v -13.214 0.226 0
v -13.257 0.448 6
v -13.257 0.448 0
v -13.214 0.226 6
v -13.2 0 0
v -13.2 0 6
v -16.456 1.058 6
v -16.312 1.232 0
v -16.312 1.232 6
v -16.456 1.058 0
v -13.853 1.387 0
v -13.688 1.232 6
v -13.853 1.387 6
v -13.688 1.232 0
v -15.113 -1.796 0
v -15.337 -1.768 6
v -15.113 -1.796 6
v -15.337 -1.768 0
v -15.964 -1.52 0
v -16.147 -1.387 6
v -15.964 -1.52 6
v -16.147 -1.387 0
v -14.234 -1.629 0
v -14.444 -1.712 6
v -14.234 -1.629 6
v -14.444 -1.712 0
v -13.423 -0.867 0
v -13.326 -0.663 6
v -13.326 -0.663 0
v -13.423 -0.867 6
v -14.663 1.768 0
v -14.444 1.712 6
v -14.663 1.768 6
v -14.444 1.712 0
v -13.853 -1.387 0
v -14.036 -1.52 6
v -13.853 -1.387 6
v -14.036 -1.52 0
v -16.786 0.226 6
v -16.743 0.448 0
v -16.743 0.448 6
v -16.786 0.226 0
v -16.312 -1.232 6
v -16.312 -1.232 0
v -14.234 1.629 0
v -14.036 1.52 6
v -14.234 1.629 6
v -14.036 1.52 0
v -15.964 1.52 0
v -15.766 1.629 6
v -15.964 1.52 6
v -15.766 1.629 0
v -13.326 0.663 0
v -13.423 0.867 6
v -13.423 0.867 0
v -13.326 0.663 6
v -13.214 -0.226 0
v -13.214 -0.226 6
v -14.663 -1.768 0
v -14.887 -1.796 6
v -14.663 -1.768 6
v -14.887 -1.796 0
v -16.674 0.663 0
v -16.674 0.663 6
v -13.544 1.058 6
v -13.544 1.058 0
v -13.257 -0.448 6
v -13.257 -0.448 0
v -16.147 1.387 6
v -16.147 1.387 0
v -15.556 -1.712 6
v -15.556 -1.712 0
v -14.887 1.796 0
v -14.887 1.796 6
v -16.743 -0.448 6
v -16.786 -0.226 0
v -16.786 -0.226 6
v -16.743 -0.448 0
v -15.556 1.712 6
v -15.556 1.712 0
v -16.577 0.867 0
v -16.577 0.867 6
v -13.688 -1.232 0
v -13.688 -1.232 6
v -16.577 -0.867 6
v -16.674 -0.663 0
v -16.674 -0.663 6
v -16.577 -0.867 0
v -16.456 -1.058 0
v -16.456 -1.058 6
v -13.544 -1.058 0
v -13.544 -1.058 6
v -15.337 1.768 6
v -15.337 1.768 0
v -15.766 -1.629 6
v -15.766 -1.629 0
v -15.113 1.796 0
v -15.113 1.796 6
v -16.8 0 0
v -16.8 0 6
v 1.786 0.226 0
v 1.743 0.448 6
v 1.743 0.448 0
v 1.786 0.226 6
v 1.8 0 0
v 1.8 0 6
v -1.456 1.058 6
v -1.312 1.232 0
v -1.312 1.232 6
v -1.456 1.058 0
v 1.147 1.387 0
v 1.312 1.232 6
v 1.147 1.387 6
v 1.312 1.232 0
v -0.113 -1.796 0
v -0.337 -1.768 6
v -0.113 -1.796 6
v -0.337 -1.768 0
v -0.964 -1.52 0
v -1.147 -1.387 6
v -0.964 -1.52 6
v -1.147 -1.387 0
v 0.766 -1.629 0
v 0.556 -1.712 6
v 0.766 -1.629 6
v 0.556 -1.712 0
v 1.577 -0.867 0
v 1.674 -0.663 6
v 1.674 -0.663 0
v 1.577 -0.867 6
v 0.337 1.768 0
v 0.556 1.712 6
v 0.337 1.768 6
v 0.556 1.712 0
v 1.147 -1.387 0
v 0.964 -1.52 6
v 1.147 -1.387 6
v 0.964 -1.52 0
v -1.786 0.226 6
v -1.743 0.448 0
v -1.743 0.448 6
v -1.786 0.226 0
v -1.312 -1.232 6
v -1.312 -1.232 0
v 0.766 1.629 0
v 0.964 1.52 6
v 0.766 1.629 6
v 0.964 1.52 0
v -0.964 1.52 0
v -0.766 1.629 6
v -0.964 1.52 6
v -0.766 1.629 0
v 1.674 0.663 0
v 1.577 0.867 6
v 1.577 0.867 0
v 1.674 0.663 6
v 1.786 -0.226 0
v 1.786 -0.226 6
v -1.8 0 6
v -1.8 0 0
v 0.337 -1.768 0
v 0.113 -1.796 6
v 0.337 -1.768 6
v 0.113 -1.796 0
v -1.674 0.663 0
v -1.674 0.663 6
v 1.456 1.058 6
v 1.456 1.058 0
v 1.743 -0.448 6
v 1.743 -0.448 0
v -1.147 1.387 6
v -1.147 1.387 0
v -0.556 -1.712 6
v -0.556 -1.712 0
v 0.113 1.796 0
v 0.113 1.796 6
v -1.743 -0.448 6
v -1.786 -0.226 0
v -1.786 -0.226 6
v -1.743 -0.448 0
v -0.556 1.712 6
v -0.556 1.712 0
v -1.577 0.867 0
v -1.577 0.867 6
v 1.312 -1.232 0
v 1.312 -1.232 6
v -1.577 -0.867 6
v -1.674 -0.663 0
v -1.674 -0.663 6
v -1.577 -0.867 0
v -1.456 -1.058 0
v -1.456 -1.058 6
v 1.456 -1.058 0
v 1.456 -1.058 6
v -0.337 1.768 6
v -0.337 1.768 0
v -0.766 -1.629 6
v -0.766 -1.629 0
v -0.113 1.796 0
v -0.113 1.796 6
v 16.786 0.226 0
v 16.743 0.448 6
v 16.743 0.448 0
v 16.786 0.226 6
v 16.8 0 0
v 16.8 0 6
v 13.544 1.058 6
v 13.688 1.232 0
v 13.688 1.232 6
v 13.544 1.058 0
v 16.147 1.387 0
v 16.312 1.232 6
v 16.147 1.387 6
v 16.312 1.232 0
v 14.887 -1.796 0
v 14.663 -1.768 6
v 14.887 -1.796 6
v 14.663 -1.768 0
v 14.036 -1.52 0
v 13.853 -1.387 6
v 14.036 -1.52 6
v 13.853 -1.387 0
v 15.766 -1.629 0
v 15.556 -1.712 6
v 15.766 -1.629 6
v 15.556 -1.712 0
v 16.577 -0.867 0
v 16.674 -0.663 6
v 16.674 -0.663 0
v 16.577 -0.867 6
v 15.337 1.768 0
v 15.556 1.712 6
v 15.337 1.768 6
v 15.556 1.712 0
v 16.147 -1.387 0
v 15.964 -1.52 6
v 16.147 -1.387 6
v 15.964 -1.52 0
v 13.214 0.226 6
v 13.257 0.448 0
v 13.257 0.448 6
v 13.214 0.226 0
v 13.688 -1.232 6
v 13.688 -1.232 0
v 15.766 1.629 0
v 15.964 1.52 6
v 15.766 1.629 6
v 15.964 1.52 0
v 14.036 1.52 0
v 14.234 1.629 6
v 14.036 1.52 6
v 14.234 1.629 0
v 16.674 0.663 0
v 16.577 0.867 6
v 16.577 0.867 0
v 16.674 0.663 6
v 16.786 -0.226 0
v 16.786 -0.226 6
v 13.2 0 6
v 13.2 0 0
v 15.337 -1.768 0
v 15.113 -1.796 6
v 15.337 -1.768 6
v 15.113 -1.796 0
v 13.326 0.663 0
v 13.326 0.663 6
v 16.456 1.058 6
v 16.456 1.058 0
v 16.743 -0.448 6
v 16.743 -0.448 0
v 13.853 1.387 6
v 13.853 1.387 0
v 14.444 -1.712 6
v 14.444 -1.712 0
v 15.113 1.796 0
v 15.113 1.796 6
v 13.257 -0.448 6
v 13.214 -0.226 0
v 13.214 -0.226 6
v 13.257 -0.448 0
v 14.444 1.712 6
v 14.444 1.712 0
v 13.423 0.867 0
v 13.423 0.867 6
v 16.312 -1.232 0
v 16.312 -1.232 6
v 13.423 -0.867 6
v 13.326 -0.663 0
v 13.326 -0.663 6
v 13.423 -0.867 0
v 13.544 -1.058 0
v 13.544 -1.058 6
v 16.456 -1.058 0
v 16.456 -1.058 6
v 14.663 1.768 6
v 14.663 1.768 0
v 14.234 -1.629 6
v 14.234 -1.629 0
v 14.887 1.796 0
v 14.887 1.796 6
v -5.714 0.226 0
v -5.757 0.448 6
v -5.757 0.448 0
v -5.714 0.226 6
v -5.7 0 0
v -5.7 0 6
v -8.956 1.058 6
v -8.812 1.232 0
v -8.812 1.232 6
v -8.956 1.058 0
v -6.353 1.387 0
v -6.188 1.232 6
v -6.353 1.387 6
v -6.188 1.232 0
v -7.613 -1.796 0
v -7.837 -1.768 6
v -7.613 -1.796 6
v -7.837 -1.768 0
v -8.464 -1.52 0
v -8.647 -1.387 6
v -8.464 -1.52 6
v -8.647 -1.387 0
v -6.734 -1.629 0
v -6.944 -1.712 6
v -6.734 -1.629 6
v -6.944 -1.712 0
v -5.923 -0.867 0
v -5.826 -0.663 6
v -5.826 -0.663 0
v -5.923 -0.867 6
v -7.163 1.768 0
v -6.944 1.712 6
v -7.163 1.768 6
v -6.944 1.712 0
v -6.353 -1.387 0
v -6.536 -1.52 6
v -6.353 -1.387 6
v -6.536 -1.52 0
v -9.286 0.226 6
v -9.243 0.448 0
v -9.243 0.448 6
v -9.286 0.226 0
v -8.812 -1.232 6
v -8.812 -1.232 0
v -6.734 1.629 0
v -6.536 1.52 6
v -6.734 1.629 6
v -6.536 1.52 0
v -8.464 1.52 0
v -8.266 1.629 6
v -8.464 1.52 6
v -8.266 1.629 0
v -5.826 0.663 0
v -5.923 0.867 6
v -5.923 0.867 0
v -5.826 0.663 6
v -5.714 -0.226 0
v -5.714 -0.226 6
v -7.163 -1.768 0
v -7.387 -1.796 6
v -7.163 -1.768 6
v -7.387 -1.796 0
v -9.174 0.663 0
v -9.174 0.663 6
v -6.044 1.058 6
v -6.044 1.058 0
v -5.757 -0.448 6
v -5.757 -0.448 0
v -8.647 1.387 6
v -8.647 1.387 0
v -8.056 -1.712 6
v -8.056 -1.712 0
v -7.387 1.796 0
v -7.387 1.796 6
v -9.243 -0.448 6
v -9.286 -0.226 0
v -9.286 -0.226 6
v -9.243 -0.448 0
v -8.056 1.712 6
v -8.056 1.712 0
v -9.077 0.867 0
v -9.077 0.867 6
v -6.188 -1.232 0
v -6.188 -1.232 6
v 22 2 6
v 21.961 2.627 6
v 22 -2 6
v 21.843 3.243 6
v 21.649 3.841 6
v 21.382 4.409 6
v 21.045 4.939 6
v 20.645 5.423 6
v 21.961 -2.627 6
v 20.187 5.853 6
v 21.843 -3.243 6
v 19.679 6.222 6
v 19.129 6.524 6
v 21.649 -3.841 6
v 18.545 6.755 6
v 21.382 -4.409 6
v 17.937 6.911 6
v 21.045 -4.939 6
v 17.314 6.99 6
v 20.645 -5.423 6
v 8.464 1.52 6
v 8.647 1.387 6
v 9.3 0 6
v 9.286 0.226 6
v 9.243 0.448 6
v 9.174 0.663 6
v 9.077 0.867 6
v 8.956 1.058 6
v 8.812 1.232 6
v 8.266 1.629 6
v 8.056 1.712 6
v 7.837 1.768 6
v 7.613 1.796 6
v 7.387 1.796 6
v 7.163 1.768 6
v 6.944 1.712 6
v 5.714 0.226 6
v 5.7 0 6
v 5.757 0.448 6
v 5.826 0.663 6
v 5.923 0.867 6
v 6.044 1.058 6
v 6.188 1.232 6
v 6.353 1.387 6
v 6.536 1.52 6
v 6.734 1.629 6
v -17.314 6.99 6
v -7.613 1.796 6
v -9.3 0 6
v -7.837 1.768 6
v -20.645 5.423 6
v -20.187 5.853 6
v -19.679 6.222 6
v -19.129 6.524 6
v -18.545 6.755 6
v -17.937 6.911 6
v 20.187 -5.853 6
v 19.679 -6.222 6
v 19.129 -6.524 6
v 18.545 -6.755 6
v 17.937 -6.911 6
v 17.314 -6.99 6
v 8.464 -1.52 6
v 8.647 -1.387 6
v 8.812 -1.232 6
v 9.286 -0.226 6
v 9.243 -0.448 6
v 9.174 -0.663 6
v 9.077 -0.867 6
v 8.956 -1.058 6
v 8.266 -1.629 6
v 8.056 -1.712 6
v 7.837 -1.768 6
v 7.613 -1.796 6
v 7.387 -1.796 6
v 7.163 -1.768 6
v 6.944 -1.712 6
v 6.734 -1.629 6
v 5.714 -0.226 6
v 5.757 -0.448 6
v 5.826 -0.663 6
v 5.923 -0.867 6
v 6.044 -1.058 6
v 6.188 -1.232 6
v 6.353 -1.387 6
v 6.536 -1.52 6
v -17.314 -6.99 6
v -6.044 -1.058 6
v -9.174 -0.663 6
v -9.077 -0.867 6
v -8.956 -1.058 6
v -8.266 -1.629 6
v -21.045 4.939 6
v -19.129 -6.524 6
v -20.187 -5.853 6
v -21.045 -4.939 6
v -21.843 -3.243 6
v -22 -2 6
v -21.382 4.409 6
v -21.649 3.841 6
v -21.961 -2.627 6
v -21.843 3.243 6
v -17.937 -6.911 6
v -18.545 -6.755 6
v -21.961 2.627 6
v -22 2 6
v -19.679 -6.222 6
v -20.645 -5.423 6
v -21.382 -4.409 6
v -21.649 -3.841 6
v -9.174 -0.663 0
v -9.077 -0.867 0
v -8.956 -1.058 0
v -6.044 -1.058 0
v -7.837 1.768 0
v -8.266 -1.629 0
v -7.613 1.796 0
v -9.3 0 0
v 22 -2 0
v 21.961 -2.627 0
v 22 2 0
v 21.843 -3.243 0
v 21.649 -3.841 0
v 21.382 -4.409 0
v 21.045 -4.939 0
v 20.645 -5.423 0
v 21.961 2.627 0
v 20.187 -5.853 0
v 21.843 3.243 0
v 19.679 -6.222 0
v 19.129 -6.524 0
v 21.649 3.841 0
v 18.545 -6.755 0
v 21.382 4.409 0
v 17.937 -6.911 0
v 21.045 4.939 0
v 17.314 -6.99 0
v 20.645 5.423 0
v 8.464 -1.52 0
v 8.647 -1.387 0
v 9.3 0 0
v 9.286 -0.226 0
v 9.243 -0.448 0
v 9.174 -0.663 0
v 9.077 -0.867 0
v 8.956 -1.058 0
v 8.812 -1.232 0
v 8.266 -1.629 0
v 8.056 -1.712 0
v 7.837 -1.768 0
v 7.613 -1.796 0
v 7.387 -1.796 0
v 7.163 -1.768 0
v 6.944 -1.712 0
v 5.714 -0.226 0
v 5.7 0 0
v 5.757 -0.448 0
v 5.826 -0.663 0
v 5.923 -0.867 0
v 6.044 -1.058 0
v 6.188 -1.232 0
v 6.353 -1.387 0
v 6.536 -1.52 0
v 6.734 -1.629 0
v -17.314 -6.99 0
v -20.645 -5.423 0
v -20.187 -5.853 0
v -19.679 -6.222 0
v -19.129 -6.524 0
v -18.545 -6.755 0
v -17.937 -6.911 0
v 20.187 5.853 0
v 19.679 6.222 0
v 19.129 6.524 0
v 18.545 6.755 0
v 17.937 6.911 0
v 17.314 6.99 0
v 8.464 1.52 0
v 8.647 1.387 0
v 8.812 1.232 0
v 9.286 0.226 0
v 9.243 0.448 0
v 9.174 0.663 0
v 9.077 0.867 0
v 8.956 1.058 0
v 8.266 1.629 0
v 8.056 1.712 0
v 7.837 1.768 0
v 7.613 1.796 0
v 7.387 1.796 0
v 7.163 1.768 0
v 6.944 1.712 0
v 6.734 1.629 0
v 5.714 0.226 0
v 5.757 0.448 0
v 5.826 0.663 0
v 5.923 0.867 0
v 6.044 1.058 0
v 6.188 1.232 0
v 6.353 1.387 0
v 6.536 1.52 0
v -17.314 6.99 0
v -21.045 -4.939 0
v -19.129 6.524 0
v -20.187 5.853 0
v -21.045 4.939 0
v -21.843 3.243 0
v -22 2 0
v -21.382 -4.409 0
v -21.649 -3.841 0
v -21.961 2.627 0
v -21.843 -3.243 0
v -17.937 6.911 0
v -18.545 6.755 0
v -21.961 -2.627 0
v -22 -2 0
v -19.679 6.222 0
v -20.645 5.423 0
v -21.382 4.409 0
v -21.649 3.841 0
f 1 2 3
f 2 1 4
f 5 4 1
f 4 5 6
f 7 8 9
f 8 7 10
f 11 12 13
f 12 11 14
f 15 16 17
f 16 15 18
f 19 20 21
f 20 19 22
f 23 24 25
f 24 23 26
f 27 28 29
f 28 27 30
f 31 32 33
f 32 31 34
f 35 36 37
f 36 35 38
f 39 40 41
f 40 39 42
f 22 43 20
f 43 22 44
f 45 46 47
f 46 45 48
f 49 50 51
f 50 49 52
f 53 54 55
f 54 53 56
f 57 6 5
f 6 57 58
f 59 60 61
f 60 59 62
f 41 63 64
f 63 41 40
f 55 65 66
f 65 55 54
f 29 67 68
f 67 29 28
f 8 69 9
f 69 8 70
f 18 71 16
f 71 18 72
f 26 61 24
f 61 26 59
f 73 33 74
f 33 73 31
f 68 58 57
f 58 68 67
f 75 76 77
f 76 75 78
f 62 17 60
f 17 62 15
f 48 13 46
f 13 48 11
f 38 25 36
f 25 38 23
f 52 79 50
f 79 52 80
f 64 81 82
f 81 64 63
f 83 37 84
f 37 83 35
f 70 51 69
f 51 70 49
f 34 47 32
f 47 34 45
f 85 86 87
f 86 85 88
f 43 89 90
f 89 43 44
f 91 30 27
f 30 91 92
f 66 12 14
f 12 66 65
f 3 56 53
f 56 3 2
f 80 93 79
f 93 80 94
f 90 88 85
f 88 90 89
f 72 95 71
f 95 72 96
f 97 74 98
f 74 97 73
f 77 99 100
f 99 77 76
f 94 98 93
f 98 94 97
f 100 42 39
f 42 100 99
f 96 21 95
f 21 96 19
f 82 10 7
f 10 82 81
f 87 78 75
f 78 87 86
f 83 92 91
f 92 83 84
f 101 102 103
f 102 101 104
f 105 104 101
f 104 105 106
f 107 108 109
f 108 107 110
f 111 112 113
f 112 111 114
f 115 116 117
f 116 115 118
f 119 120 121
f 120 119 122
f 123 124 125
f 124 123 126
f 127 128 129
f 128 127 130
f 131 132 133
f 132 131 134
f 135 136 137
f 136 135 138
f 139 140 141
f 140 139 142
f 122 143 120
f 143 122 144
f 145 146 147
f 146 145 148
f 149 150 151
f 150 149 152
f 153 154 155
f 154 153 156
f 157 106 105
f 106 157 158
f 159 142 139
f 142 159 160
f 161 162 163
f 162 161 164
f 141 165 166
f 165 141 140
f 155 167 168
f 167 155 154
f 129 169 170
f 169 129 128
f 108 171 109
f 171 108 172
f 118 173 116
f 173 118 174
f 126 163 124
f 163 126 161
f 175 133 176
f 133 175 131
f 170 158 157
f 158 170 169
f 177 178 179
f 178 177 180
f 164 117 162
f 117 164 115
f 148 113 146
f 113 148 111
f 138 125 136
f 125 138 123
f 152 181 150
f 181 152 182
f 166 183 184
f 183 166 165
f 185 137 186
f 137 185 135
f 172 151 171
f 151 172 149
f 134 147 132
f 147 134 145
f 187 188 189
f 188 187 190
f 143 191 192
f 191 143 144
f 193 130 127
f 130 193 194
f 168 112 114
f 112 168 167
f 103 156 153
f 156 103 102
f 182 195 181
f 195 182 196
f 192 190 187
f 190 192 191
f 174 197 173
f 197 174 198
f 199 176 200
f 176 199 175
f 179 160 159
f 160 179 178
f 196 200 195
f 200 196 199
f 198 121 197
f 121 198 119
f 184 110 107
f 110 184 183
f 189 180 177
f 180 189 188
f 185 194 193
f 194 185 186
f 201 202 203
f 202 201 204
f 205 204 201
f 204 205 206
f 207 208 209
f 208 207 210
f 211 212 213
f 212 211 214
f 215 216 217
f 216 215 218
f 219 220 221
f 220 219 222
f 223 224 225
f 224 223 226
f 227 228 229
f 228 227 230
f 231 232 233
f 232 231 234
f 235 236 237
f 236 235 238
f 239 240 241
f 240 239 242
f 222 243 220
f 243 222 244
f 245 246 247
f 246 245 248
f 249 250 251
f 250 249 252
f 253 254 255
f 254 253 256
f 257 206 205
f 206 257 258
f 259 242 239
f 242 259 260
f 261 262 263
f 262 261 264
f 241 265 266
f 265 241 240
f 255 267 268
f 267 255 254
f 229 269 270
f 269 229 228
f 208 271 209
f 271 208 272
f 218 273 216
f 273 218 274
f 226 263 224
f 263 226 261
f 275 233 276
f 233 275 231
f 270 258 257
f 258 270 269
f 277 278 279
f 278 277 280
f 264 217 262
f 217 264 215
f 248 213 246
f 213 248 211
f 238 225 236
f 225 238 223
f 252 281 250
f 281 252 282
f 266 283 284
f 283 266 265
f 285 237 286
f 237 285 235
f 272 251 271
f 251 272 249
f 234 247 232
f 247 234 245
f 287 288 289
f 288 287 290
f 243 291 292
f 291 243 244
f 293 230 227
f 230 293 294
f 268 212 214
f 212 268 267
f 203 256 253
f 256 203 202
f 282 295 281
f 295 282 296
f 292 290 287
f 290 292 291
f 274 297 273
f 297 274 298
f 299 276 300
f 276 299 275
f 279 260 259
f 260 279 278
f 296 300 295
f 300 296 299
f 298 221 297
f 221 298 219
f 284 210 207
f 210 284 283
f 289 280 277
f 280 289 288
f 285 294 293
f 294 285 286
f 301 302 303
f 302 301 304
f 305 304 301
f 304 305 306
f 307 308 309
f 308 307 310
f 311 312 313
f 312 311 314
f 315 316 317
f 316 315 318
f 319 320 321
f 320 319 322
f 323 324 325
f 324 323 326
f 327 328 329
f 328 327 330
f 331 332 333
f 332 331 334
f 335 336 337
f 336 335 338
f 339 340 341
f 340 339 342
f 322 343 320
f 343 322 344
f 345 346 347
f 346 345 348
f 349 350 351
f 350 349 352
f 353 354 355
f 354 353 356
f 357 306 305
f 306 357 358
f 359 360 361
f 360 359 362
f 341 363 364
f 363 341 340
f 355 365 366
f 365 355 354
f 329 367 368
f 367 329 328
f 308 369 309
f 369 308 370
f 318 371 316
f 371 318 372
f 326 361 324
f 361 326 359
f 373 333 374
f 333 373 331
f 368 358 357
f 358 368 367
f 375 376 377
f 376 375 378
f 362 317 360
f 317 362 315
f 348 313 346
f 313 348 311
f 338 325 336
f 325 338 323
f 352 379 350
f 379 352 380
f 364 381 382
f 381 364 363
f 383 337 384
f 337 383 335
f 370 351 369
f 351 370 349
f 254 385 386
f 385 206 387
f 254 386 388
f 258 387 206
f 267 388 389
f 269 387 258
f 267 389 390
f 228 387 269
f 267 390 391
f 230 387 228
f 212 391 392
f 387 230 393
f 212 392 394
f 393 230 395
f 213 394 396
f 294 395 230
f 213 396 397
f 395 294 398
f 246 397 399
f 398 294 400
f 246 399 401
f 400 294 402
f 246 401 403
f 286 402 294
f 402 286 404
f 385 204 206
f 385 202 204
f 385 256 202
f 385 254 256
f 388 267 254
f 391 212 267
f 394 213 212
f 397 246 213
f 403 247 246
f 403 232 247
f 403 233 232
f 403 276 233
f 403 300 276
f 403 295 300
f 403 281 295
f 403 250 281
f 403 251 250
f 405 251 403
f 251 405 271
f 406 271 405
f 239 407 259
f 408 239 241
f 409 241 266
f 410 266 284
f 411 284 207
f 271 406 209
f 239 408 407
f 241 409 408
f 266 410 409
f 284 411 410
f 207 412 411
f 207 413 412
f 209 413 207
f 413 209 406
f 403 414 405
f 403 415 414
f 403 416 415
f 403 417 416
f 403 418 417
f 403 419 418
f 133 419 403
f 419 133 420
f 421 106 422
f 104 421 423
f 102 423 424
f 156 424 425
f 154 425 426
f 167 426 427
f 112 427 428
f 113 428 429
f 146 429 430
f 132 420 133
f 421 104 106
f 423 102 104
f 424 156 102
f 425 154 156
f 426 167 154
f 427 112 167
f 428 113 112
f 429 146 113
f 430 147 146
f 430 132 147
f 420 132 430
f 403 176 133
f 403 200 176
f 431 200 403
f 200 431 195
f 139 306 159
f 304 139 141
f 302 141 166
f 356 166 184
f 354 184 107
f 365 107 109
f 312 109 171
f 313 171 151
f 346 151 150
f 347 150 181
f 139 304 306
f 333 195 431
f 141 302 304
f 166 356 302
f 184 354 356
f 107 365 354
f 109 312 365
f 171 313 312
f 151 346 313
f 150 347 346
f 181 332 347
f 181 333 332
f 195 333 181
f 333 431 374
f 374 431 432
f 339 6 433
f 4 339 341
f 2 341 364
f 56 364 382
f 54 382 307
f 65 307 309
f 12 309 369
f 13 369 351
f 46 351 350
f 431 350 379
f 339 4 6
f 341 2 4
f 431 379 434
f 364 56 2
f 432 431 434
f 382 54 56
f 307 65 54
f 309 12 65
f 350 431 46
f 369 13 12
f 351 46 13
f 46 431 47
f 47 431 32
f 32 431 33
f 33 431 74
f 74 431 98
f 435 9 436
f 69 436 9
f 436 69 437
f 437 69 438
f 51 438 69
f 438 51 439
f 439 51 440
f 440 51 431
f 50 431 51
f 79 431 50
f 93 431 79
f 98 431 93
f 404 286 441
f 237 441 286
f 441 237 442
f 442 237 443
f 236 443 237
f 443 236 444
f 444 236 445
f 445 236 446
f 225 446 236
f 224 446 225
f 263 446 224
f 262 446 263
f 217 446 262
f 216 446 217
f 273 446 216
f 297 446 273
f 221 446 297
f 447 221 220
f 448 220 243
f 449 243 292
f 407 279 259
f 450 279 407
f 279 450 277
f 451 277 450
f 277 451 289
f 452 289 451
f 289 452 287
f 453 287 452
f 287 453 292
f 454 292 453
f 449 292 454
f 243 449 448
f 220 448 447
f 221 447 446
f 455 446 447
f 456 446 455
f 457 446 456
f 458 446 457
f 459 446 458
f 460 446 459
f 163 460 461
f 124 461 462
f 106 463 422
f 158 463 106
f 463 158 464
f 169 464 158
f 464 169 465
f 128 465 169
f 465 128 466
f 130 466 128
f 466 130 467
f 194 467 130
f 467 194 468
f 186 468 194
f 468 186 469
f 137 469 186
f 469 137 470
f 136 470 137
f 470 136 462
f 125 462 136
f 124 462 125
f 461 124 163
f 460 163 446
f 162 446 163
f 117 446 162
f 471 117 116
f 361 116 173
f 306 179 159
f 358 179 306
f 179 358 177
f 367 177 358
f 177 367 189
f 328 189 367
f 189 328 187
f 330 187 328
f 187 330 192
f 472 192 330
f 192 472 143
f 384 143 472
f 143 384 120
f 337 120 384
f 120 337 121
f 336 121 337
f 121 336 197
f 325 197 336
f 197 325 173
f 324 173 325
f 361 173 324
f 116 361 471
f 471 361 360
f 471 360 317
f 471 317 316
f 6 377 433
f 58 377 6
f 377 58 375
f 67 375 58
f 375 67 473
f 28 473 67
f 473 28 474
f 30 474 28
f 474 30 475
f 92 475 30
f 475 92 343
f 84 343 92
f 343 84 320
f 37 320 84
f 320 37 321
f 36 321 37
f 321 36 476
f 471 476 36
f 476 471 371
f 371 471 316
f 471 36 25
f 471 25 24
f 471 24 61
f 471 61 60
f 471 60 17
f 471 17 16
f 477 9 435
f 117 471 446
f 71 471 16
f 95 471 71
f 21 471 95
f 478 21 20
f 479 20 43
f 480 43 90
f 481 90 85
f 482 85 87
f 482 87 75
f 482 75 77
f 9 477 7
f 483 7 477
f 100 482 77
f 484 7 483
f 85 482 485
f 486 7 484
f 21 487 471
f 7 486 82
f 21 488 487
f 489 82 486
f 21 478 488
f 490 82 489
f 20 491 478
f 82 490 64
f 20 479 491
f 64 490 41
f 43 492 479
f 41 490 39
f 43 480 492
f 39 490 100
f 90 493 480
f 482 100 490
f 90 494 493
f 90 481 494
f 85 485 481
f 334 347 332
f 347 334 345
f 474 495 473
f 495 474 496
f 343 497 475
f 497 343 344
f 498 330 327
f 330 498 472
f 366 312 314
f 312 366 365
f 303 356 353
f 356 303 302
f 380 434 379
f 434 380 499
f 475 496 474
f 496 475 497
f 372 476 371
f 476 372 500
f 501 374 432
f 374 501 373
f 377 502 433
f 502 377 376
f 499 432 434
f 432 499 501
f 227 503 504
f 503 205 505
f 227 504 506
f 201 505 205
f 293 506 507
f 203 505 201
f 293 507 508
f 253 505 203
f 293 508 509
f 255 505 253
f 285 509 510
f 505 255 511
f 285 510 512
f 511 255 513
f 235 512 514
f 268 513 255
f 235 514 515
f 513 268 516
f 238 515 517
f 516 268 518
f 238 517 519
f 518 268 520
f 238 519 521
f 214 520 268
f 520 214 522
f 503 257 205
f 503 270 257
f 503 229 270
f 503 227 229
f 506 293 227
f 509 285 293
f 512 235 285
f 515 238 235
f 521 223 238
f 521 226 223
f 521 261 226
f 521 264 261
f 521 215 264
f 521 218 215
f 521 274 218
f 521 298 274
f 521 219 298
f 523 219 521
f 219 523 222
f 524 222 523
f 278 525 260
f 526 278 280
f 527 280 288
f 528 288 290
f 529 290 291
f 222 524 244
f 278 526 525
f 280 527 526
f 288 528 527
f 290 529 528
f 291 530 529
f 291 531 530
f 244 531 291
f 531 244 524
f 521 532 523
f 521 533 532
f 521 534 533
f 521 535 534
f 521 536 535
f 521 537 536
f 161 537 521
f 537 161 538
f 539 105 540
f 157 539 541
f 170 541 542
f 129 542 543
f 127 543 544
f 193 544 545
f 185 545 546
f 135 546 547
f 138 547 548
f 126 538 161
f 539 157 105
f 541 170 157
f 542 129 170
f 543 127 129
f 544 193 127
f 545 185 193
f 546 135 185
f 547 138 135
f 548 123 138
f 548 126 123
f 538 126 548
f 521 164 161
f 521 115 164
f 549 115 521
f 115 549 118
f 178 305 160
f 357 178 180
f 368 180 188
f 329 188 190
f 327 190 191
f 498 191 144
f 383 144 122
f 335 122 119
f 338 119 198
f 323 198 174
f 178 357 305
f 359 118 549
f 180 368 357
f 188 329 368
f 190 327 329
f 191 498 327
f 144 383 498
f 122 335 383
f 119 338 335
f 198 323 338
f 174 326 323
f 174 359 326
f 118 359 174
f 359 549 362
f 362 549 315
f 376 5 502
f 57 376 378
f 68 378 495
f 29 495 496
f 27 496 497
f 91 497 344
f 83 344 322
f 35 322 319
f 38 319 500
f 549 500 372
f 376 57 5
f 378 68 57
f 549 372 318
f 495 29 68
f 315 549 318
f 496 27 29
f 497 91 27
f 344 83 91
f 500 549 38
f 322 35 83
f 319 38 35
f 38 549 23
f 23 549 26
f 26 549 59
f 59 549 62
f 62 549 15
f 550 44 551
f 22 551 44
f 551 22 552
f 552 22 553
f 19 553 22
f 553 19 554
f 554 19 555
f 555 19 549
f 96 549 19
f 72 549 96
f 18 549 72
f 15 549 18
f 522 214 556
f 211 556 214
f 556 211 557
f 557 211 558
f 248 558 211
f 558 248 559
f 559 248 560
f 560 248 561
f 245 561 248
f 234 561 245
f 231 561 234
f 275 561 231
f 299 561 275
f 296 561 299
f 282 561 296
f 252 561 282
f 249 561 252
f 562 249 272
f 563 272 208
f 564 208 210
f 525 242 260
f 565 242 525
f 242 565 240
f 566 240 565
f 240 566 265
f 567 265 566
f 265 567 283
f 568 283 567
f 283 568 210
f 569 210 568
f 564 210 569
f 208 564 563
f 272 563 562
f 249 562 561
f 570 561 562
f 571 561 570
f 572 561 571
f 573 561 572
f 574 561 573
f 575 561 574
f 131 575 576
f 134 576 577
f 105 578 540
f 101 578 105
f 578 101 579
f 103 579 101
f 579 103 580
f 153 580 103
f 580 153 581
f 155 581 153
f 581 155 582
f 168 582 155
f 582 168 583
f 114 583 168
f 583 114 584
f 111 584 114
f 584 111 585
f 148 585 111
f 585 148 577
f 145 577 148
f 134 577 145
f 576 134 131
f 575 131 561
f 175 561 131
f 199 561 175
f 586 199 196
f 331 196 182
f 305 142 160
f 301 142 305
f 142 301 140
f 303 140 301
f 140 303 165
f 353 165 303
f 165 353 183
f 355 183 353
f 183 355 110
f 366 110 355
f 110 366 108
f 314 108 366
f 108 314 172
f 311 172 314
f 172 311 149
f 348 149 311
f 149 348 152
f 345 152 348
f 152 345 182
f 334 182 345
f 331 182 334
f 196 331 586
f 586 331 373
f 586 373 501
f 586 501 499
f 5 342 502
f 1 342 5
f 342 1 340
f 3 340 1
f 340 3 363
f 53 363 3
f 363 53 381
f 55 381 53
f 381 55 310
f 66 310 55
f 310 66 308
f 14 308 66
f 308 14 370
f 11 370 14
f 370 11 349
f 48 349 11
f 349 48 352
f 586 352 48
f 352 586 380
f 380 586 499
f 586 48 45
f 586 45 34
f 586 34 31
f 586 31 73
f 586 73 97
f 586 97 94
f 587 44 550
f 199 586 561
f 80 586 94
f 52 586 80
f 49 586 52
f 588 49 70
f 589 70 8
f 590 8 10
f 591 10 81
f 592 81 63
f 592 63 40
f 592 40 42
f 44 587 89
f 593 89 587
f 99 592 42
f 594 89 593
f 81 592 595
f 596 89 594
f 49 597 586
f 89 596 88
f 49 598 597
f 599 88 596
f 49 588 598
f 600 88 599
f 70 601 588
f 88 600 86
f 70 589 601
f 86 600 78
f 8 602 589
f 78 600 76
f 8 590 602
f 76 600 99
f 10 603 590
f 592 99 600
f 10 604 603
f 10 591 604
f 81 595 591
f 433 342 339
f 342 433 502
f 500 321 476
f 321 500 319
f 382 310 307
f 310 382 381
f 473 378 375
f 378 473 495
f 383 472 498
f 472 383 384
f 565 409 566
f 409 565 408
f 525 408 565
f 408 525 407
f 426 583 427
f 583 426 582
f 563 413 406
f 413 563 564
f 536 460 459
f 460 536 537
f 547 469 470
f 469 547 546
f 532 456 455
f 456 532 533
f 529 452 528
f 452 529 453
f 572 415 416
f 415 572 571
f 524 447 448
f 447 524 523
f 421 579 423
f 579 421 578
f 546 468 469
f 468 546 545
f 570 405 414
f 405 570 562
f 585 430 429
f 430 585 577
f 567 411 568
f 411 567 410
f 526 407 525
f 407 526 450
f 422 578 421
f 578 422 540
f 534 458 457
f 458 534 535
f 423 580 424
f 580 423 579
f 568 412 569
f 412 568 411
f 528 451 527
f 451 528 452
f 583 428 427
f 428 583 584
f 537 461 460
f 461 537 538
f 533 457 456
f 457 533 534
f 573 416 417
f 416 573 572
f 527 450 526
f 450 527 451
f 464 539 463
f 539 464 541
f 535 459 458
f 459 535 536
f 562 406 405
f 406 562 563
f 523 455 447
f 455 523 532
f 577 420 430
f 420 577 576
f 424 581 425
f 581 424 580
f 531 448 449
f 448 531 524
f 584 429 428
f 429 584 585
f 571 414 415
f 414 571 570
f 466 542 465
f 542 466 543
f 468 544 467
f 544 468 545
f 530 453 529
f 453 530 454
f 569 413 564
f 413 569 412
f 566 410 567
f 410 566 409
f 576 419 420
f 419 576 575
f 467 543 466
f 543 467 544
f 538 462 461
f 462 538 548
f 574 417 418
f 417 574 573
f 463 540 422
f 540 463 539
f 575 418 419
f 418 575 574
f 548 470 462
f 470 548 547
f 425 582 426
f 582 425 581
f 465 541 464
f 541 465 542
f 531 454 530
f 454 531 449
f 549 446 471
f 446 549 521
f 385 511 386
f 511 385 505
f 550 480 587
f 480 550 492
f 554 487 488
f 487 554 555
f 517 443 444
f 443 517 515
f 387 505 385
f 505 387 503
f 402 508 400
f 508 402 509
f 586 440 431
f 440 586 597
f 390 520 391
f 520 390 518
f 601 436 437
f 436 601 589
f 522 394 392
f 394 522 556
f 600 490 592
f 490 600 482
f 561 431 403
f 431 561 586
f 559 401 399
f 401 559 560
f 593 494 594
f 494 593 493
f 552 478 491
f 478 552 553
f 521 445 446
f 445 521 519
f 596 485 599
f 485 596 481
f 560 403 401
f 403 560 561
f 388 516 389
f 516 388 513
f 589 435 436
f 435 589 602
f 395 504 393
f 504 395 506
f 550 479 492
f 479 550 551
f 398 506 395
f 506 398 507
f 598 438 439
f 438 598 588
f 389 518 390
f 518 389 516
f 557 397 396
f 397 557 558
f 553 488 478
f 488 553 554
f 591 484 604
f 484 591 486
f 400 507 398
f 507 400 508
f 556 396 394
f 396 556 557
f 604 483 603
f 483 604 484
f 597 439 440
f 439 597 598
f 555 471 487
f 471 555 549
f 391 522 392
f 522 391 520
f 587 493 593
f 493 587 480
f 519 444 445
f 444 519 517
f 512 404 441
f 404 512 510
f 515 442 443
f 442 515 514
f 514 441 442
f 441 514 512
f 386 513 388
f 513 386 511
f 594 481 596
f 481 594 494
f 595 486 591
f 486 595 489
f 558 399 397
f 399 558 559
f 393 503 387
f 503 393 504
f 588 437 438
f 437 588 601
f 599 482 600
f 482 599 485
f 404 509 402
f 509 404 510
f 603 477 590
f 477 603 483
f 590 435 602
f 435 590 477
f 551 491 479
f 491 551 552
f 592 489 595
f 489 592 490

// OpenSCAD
$fn = 50;


difference() {
	union() {
		hull() {
			translate(v = [-17.0000000000, 2.0000000000, 0]) {
				cylinder(h = 6, r = 5);
			}
			translate(v = [17.0000000000, 2.0000000000, 0]) {
				cylinder(h = 6, r = 5);
			}
			translate(v = [-17.0000000000, -2.0000000000, 0]) {
				cylinder(h = 6, r = 5);
			}
			translate(v = [17.0000000000, -2.0000000000, 0]) {
				cylinder(h = 6, r = 5);
			}
		}
	}
	union() {
		translate(v = [-15.0000000000, 0.0000000000, -100.0000000000]) {
			cylinder(h = 200, r = 1.8000000000);
		}
		translate(v = [0.0000000000, 0.0000000000, -100.0000000000]) {
			cylinder(h = 200, r = 1.8000000000);
		}
		translate(v = [15.0000000000, 0.0000000000, -100.0000000000]) {
			cylinder(h = 200, r = 1.8000000000);
		}
		translate(v = [-15.0000000000, 0.0000000000, 0]) {
			cylinder(h = 6, r = 1.8000000000);
		}
		translate(v = [-7.5000000000, 0.0000000000, 0]) {
			cylinder(h = 6, r = 1.8000000000);
		}
		cylinder(h = 6, r = 1.8000000000);
		translate(v = [7.5000000000, 0.0000000000, 0]) {
			cylinder(h = 6, r = 1.8000000000);
		}
		translate(v = [15.0000000000, 0.0000000000, 0]) {
			cylinder(h = 6, r = 1.8000000000);
		}
		translate(v = [-15.0000000000, 0.0000000000, 0]) {
			cylinder(h = 6, r = 1.8000000000);
		}
		translate(v = [-7.5000000000, 0.0000000000, 0]) {
			cylinder(h = 6, r = 1.8000000000);
		}
		cylinder(h = 6, r = 1.8000000000);
		translate(v = [7.5000000000, 0.0000000000, 0]) {
			cylinder(h = 6, r = 1.8000000000);
		}
		translate(v = [15.0000000000, 0.0000000000, 0]) {
			cylinder(h = 6, r = 1.8000000000);
		}
		translate(v = [-15.0000000000, 0.0000000000, 0]) {
			cylinder(h = 6, r = 1.8000000000);
		}
		translate(v = [-7.5000000000, 0.0000000000, 0]) {
			cylinder(h = 6, r = 1.8000000000);
		}
		cylinder(h = 6, r = 1.8000000000);
		translate(v = [7.5000000000, 0.0000000000, 0]) {
			cylinder(h = 6, r = 1.8000000000);
		}
		translate(v = [15.0000000000, 0.0000000000, 0]) {
			cylinder(h = 6, r = 1.8000000000);
		}
	}
}
